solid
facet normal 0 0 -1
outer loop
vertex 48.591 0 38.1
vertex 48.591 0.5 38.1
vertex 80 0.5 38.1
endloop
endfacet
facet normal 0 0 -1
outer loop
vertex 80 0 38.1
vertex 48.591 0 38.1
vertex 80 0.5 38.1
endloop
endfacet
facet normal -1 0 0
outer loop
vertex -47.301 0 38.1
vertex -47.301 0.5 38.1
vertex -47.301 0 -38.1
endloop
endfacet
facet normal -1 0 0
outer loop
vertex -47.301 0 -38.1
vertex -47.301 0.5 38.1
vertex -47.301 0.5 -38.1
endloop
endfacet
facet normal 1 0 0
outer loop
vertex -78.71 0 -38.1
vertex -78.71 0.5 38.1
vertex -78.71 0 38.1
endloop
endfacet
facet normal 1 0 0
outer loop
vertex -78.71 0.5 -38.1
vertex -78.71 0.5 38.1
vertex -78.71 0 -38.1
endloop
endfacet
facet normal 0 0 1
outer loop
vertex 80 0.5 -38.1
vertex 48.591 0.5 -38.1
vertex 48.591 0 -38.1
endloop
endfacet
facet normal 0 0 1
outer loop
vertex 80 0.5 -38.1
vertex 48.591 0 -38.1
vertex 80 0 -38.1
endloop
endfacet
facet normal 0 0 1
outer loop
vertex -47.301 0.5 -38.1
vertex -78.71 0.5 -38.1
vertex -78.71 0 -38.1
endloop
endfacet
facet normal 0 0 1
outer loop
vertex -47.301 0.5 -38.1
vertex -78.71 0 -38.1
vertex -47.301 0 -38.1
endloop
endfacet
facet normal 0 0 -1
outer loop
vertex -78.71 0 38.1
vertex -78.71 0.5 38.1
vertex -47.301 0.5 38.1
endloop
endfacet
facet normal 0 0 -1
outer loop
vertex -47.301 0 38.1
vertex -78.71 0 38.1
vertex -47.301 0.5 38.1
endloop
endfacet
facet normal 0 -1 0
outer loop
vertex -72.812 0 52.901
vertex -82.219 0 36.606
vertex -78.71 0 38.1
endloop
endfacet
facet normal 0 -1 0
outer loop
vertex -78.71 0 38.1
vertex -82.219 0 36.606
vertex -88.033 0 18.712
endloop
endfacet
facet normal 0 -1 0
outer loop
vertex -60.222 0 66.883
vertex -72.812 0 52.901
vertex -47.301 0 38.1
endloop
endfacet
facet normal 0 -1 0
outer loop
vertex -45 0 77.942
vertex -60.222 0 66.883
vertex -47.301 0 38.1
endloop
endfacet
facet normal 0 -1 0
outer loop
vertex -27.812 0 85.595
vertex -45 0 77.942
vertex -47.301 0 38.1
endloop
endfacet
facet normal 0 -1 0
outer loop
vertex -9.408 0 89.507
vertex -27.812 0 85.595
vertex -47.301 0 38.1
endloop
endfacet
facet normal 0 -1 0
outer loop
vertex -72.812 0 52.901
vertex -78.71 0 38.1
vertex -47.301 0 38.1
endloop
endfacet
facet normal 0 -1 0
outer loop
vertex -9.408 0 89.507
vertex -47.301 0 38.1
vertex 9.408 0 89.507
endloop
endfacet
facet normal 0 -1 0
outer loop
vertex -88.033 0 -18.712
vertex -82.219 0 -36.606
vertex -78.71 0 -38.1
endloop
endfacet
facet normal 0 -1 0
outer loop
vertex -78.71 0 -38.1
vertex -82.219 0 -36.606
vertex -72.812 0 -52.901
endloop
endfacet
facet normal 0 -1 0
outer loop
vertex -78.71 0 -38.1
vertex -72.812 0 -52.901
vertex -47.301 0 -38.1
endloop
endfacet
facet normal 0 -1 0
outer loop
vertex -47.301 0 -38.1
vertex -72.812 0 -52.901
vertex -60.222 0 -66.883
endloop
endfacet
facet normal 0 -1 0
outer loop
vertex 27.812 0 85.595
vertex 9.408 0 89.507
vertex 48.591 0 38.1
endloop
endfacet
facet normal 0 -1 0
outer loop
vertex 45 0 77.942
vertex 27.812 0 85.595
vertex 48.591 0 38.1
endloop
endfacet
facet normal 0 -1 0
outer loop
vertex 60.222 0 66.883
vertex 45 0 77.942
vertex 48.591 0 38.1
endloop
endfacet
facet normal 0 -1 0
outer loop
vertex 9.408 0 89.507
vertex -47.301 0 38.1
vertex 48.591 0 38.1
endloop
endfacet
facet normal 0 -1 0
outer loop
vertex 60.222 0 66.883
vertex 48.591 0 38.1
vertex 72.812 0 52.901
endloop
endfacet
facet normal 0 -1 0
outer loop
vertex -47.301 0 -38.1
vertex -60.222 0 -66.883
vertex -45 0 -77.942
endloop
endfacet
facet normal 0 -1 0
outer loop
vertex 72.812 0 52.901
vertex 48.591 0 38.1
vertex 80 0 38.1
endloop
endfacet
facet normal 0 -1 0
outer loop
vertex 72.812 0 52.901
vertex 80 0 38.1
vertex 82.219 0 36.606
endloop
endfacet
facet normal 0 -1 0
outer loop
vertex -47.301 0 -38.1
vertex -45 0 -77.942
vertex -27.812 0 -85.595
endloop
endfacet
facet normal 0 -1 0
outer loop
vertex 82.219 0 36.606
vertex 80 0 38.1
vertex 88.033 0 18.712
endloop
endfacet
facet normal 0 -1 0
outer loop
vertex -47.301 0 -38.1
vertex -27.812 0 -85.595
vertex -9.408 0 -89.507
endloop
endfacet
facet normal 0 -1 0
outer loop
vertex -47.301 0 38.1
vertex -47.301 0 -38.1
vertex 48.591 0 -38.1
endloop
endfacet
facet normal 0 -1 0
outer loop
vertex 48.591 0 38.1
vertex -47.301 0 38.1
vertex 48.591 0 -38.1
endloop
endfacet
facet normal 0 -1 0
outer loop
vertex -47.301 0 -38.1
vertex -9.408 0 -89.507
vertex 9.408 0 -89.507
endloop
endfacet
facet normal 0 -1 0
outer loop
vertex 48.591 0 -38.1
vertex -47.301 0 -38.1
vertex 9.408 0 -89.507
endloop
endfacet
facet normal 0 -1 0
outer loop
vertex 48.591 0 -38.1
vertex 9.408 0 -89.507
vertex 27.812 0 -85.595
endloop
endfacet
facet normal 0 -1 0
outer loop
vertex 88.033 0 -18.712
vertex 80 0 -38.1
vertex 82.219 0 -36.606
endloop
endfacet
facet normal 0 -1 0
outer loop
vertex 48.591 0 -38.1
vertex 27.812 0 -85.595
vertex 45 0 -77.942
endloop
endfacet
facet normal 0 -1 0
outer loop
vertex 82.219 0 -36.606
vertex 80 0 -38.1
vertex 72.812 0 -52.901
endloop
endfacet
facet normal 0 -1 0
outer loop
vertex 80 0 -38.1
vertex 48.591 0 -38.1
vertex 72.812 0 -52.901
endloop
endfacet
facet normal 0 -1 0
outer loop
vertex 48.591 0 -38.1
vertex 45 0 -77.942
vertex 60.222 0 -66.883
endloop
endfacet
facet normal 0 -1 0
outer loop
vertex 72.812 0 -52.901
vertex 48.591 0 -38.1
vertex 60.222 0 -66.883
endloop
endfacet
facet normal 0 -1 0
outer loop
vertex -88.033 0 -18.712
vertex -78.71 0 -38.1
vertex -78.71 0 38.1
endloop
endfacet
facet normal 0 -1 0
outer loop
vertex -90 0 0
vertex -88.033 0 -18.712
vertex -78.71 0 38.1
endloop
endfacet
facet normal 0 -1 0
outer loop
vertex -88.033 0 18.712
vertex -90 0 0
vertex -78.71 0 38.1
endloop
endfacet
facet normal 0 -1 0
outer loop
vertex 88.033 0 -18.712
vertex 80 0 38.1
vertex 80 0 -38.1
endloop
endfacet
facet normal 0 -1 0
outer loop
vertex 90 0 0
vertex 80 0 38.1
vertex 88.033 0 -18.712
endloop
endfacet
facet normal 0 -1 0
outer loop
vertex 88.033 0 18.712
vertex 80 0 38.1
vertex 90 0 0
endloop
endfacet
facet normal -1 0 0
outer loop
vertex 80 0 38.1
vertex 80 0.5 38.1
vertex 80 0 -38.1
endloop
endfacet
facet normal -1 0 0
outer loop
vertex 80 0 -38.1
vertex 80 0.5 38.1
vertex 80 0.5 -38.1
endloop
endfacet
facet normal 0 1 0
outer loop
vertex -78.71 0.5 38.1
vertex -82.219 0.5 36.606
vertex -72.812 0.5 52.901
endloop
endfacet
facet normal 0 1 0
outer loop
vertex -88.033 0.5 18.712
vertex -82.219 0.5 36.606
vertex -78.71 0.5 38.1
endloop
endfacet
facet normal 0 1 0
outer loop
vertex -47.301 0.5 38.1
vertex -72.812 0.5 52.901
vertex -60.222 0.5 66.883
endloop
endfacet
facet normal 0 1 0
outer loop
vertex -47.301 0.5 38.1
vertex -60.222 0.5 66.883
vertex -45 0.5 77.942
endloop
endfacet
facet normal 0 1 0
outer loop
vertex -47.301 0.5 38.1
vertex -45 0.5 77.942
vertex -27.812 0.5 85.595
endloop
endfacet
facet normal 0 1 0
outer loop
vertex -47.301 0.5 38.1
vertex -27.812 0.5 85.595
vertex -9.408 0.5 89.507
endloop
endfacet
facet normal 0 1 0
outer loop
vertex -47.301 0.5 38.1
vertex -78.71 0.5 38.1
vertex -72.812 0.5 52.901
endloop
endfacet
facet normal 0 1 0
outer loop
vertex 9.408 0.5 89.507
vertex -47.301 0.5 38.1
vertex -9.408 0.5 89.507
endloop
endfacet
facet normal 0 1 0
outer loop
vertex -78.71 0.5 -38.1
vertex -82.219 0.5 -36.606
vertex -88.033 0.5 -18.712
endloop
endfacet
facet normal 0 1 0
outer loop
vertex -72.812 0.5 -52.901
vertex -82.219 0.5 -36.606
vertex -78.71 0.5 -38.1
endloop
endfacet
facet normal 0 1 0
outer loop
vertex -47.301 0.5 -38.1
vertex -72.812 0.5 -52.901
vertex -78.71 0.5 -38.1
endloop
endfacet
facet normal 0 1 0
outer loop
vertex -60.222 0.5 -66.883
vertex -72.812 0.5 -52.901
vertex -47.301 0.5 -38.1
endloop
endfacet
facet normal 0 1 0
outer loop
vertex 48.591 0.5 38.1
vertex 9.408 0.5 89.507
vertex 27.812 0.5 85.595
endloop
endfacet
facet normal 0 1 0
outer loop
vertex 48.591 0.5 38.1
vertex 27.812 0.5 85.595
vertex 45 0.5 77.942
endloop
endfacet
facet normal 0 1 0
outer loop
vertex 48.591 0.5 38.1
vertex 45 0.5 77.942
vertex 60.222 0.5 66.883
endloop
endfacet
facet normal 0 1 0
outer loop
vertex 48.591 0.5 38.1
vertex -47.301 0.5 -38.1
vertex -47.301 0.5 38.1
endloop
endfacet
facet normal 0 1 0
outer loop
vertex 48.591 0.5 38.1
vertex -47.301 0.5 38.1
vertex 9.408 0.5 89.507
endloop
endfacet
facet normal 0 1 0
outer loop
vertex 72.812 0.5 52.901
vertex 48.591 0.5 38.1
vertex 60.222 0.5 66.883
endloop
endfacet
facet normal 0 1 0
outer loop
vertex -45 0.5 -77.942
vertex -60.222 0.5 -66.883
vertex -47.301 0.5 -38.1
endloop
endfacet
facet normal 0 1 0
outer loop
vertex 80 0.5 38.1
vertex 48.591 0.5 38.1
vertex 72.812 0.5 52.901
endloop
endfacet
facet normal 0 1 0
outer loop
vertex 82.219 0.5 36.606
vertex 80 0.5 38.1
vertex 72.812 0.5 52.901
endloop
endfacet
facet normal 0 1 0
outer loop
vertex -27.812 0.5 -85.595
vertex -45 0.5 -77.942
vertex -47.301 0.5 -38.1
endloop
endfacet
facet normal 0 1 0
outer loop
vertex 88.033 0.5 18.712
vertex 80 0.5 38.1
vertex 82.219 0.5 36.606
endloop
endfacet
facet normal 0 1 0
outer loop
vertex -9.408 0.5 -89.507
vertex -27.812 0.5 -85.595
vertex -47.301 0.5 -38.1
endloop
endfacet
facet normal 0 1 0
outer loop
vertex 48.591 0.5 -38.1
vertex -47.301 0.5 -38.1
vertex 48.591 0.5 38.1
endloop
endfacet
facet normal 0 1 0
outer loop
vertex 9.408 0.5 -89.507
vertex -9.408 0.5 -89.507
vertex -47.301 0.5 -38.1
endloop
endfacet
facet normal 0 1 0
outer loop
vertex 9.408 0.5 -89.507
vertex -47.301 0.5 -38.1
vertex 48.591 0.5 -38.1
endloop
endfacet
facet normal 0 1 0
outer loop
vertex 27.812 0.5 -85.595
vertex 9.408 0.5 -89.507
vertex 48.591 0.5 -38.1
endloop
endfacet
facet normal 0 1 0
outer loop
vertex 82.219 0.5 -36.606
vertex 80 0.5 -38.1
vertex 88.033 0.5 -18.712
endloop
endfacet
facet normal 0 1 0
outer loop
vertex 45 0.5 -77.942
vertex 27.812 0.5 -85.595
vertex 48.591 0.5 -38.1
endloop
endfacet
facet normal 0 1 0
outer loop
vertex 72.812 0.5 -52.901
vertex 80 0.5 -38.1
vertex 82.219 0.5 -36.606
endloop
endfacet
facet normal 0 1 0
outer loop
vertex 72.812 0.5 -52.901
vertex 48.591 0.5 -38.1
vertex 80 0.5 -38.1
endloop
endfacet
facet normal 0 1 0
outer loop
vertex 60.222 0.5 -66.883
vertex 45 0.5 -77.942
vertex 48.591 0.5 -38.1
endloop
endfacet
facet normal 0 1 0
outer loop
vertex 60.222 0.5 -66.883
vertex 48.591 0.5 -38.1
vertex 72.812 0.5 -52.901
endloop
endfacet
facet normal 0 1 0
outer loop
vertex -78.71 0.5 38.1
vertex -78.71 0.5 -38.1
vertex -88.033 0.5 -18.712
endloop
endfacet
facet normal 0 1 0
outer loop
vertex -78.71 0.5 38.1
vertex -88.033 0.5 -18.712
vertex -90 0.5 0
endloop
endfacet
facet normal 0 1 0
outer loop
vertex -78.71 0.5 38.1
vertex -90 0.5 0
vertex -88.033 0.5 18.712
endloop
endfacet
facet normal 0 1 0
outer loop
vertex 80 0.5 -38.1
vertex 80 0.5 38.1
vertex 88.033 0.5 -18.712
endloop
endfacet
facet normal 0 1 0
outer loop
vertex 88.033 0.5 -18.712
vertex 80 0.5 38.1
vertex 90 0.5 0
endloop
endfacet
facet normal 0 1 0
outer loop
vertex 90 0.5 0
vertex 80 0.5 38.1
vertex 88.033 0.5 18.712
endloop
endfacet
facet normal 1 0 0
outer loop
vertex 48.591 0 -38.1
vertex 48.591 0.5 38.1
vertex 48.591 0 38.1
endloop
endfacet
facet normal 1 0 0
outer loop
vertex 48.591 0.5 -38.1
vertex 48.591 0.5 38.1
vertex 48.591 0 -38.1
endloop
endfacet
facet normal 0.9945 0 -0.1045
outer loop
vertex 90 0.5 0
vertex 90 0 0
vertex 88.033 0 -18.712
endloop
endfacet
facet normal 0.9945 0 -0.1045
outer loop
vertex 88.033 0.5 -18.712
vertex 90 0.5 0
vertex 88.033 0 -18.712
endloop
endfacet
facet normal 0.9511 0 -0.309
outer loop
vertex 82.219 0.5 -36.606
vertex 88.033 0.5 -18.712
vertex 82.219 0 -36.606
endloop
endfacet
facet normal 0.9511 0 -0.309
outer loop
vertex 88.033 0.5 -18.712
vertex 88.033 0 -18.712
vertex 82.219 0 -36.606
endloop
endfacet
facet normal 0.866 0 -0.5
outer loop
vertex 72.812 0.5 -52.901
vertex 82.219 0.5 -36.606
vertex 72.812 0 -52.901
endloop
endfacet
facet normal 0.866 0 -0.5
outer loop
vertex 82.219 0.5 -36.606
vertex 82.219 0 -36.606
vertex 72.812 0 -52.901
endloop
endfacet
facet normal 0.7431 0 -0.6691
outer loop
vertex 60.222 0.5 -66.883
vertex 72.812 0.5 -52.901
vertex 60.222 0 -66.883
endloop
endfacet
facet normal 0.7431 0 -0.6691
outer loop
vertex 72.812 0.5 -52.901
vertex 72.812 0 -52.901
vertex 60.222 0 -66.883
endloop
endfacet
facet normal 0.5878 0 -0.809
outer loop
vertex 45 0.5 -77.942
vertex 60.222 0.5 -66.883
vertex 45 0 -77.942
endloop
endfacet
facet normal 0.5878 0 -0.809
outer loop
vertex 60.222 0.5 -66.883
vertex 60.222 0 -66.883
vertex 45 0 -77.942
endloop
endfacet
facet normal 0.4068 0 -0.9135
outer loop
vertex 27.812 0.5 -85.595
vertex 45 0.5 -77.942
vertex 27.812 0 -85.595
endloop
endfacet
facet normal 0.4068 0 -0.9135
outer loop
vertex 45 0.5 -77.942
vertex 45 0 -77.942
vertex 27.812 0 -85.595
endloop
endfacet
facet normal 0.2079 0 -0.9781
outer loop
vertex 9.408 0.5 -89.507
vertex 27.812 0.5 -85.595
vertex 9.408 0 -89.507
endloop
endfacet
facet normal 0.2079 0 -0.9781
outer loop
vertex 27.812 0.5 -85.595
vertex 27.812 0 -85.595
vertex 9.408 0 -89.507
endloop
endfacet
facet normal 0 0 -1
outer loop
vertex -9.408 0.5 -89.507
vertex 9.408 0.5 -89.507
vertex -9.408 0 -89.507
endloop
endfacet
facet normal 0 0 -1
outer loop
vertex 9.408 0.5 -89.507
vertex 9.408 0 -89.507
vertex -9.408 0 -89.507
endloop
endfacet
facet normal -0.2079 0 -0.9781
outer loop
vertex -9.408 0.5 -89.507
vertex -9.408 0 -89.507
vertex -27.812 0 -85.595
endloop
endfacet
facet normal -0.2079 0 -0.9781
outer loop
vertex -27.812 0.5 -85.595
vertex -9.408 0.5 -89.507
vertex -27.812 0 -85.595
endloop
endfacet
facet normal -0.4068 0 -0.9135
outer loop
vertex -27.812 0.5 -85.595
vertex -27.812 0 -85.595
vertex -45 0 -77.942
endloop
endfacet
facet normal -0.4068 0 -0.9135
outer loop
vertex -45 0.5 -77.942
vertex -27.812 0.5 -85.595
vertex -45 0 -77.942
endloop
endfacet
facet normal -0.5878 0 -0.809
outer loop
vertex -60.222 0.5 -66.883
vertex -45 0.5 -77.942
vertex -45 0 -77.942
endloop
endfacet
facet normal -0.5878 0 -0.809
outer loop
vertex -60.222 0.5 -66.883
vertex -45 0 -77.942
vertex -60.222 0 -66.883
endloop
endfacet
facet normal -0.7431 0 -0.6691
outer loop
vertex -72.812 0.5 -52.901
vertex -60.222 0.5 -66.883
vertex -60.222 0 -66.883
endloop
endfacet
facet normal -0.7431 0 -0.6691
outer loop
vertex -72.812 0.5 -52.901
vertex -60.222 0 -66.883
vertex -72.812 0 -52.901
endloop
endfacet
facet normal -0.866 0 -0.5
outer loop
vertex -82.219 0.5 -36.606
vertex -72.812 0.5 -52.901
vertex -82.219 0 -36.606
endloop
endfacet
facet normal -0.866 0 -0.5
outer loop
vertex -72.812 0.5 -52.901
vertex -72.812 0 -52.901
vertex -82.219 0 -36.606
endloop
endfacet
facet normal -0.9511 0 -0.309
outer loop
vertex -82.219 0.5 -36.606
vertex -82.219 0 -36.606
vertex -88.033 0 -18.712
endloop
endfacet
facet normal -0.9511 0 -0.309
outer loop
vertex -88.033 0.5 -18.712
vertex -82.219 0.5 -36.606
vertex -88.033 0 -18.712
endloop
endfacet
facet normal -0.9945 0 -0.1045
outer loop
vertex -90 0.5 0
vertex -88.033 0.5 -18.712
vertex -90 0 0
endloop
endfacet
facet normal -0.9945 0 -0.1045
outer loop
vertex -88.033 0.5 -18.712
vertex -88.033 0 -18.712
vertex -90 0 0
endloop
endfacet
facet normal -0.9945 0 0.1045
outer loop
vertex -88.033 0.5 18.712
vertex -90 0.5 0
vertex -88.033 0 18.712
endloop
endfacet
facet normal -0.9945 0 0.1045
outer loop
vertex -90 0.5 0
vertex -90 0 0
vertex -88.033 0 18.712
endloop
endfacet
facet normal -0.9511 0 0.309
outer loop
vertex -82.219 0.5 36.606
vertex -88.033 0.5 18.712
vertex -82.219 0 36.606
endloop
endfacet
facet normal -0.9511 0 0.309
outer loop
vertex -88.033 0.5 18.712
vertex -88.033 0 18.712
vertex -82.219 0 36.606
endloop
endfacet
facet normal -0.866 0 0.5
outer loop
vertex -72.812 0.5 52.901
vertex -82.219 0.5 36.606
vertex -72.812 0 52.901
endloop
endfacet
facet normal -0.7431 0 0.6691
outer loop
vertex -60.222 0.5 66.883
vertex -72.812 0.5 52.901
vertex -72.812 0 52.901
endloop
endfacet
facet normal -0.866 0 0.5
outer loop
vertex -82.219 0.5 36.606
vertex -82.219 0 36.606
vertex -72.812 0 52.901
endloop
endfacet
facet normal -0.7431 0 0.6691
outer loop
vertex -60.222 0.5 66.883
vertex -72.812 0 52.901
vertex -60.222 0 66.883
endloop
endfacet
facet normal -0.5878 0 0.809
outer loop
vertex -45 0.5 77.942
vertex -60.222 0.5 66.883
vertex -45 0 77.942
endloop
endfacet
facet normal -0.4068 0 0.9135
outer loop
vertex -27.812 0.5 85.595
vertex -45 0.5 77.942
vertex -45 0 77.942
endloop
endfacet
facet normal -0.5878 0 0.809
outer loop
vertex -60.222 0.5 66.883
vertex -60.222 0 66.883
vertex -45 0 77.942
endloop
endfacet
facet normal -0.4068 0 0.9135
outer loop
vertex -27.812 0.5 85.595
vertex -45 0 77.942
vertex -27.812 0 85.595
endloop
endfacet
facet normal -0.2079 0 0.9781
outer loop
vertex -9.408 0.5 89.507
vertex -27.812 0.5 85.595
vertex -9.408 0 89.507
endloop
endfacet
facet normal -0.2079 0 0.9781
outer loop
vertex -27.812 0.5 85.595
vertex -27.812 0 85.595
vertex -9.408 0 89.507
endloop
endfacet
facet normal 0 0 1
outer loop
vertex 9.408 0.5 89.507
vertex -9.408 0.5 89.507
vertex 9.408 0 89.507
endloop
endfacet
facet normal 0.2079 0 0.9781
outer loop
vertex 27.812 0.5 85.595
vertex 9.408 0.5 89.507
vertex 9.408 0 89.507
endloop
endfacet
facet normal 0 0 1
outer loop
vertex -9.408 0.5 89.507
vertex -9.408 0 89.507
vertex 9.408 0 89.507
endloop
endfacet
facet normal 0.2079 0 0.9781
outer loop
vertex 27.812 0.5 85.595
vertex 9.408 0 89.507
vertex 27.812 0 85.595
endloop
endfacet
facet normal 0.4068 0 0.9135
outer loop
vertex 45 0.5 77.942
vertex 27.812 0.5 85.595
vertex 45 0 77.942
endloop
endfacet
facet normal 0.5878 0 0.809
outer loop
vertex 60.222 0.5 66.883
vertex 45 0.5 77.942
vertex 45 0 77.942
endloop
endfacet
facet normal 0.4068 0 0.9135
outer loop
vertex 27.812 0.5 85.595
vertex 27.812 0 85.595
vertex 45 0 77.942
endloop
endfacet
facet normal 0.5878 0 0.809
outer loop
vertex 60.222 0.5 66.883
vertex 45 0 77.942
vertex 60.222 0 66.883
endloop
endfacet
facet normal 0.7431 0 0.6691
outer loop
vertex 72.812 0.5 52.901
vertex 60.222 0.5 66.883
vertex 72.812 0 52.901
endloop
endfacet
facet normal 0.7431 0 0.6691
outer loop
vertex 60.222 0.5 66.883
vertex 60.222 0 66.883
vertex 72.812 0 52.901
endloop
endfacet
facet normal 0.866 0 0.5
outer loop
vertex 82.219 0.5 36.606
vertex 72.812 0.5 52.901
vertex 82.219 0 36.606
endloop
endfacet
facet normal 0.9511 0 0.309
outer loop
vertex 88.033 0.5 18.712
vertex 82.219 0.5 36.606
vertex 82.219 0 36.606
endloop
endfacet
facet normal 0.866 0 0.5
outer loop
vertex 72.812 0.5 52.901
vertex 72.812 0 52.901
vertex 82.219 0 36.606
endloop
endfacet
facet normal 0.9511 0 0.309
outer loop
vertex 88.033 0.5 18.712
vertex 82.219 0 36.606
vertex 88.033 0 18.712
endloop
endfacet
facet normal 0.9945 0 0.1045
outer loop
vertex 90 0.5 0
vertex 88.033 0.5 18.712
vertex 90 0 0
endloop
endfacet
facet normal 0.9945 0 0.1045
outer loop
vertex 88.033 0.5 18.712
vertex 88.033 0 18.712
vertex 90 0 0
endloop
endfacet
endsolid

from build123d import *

# Parameters (mm, degrees)
SKETCH1_R           = 90
BOSS_EXTRUDE1_DEPTH = 0.5
SKETCH3_W           = 31.4086089
SKETCH3_H           = 76.2
CUT_EXTRUDE2_DEPTH  = 1


with BuildPart() as part:
    # Sketch1 → Boss-Extrude1 (new body)
    with BuildSketch(Plane(origin=(0, 0, 0), x_dir=(1, 0, 0), z_dir=(0, 1, 0))):
        Circle(SKETCH1_R)
    extrude(amount=BOSS_EXTRUDE1_DEPTH)

    # Sketch3 → Cut-Extrude2 (cut)
    with BuildSketch(Plane(origin=(0, 0.5, 0), x_dir=(1, 0, 0), z_dir=(0, 1, 0))):
        with Locations((64.29569555, 0)):
            Rectangle(SKETCH3_W, SKETCH3_H)
        with Locations((-63.00534762, 0)):
            Rectangle(SKETCH3_W, SKETCH3_H)
    extrude(amount=-CUT_EXTRUDE2_DEPTH, mode=Mode.SUBTRACT)


solid = part.part
